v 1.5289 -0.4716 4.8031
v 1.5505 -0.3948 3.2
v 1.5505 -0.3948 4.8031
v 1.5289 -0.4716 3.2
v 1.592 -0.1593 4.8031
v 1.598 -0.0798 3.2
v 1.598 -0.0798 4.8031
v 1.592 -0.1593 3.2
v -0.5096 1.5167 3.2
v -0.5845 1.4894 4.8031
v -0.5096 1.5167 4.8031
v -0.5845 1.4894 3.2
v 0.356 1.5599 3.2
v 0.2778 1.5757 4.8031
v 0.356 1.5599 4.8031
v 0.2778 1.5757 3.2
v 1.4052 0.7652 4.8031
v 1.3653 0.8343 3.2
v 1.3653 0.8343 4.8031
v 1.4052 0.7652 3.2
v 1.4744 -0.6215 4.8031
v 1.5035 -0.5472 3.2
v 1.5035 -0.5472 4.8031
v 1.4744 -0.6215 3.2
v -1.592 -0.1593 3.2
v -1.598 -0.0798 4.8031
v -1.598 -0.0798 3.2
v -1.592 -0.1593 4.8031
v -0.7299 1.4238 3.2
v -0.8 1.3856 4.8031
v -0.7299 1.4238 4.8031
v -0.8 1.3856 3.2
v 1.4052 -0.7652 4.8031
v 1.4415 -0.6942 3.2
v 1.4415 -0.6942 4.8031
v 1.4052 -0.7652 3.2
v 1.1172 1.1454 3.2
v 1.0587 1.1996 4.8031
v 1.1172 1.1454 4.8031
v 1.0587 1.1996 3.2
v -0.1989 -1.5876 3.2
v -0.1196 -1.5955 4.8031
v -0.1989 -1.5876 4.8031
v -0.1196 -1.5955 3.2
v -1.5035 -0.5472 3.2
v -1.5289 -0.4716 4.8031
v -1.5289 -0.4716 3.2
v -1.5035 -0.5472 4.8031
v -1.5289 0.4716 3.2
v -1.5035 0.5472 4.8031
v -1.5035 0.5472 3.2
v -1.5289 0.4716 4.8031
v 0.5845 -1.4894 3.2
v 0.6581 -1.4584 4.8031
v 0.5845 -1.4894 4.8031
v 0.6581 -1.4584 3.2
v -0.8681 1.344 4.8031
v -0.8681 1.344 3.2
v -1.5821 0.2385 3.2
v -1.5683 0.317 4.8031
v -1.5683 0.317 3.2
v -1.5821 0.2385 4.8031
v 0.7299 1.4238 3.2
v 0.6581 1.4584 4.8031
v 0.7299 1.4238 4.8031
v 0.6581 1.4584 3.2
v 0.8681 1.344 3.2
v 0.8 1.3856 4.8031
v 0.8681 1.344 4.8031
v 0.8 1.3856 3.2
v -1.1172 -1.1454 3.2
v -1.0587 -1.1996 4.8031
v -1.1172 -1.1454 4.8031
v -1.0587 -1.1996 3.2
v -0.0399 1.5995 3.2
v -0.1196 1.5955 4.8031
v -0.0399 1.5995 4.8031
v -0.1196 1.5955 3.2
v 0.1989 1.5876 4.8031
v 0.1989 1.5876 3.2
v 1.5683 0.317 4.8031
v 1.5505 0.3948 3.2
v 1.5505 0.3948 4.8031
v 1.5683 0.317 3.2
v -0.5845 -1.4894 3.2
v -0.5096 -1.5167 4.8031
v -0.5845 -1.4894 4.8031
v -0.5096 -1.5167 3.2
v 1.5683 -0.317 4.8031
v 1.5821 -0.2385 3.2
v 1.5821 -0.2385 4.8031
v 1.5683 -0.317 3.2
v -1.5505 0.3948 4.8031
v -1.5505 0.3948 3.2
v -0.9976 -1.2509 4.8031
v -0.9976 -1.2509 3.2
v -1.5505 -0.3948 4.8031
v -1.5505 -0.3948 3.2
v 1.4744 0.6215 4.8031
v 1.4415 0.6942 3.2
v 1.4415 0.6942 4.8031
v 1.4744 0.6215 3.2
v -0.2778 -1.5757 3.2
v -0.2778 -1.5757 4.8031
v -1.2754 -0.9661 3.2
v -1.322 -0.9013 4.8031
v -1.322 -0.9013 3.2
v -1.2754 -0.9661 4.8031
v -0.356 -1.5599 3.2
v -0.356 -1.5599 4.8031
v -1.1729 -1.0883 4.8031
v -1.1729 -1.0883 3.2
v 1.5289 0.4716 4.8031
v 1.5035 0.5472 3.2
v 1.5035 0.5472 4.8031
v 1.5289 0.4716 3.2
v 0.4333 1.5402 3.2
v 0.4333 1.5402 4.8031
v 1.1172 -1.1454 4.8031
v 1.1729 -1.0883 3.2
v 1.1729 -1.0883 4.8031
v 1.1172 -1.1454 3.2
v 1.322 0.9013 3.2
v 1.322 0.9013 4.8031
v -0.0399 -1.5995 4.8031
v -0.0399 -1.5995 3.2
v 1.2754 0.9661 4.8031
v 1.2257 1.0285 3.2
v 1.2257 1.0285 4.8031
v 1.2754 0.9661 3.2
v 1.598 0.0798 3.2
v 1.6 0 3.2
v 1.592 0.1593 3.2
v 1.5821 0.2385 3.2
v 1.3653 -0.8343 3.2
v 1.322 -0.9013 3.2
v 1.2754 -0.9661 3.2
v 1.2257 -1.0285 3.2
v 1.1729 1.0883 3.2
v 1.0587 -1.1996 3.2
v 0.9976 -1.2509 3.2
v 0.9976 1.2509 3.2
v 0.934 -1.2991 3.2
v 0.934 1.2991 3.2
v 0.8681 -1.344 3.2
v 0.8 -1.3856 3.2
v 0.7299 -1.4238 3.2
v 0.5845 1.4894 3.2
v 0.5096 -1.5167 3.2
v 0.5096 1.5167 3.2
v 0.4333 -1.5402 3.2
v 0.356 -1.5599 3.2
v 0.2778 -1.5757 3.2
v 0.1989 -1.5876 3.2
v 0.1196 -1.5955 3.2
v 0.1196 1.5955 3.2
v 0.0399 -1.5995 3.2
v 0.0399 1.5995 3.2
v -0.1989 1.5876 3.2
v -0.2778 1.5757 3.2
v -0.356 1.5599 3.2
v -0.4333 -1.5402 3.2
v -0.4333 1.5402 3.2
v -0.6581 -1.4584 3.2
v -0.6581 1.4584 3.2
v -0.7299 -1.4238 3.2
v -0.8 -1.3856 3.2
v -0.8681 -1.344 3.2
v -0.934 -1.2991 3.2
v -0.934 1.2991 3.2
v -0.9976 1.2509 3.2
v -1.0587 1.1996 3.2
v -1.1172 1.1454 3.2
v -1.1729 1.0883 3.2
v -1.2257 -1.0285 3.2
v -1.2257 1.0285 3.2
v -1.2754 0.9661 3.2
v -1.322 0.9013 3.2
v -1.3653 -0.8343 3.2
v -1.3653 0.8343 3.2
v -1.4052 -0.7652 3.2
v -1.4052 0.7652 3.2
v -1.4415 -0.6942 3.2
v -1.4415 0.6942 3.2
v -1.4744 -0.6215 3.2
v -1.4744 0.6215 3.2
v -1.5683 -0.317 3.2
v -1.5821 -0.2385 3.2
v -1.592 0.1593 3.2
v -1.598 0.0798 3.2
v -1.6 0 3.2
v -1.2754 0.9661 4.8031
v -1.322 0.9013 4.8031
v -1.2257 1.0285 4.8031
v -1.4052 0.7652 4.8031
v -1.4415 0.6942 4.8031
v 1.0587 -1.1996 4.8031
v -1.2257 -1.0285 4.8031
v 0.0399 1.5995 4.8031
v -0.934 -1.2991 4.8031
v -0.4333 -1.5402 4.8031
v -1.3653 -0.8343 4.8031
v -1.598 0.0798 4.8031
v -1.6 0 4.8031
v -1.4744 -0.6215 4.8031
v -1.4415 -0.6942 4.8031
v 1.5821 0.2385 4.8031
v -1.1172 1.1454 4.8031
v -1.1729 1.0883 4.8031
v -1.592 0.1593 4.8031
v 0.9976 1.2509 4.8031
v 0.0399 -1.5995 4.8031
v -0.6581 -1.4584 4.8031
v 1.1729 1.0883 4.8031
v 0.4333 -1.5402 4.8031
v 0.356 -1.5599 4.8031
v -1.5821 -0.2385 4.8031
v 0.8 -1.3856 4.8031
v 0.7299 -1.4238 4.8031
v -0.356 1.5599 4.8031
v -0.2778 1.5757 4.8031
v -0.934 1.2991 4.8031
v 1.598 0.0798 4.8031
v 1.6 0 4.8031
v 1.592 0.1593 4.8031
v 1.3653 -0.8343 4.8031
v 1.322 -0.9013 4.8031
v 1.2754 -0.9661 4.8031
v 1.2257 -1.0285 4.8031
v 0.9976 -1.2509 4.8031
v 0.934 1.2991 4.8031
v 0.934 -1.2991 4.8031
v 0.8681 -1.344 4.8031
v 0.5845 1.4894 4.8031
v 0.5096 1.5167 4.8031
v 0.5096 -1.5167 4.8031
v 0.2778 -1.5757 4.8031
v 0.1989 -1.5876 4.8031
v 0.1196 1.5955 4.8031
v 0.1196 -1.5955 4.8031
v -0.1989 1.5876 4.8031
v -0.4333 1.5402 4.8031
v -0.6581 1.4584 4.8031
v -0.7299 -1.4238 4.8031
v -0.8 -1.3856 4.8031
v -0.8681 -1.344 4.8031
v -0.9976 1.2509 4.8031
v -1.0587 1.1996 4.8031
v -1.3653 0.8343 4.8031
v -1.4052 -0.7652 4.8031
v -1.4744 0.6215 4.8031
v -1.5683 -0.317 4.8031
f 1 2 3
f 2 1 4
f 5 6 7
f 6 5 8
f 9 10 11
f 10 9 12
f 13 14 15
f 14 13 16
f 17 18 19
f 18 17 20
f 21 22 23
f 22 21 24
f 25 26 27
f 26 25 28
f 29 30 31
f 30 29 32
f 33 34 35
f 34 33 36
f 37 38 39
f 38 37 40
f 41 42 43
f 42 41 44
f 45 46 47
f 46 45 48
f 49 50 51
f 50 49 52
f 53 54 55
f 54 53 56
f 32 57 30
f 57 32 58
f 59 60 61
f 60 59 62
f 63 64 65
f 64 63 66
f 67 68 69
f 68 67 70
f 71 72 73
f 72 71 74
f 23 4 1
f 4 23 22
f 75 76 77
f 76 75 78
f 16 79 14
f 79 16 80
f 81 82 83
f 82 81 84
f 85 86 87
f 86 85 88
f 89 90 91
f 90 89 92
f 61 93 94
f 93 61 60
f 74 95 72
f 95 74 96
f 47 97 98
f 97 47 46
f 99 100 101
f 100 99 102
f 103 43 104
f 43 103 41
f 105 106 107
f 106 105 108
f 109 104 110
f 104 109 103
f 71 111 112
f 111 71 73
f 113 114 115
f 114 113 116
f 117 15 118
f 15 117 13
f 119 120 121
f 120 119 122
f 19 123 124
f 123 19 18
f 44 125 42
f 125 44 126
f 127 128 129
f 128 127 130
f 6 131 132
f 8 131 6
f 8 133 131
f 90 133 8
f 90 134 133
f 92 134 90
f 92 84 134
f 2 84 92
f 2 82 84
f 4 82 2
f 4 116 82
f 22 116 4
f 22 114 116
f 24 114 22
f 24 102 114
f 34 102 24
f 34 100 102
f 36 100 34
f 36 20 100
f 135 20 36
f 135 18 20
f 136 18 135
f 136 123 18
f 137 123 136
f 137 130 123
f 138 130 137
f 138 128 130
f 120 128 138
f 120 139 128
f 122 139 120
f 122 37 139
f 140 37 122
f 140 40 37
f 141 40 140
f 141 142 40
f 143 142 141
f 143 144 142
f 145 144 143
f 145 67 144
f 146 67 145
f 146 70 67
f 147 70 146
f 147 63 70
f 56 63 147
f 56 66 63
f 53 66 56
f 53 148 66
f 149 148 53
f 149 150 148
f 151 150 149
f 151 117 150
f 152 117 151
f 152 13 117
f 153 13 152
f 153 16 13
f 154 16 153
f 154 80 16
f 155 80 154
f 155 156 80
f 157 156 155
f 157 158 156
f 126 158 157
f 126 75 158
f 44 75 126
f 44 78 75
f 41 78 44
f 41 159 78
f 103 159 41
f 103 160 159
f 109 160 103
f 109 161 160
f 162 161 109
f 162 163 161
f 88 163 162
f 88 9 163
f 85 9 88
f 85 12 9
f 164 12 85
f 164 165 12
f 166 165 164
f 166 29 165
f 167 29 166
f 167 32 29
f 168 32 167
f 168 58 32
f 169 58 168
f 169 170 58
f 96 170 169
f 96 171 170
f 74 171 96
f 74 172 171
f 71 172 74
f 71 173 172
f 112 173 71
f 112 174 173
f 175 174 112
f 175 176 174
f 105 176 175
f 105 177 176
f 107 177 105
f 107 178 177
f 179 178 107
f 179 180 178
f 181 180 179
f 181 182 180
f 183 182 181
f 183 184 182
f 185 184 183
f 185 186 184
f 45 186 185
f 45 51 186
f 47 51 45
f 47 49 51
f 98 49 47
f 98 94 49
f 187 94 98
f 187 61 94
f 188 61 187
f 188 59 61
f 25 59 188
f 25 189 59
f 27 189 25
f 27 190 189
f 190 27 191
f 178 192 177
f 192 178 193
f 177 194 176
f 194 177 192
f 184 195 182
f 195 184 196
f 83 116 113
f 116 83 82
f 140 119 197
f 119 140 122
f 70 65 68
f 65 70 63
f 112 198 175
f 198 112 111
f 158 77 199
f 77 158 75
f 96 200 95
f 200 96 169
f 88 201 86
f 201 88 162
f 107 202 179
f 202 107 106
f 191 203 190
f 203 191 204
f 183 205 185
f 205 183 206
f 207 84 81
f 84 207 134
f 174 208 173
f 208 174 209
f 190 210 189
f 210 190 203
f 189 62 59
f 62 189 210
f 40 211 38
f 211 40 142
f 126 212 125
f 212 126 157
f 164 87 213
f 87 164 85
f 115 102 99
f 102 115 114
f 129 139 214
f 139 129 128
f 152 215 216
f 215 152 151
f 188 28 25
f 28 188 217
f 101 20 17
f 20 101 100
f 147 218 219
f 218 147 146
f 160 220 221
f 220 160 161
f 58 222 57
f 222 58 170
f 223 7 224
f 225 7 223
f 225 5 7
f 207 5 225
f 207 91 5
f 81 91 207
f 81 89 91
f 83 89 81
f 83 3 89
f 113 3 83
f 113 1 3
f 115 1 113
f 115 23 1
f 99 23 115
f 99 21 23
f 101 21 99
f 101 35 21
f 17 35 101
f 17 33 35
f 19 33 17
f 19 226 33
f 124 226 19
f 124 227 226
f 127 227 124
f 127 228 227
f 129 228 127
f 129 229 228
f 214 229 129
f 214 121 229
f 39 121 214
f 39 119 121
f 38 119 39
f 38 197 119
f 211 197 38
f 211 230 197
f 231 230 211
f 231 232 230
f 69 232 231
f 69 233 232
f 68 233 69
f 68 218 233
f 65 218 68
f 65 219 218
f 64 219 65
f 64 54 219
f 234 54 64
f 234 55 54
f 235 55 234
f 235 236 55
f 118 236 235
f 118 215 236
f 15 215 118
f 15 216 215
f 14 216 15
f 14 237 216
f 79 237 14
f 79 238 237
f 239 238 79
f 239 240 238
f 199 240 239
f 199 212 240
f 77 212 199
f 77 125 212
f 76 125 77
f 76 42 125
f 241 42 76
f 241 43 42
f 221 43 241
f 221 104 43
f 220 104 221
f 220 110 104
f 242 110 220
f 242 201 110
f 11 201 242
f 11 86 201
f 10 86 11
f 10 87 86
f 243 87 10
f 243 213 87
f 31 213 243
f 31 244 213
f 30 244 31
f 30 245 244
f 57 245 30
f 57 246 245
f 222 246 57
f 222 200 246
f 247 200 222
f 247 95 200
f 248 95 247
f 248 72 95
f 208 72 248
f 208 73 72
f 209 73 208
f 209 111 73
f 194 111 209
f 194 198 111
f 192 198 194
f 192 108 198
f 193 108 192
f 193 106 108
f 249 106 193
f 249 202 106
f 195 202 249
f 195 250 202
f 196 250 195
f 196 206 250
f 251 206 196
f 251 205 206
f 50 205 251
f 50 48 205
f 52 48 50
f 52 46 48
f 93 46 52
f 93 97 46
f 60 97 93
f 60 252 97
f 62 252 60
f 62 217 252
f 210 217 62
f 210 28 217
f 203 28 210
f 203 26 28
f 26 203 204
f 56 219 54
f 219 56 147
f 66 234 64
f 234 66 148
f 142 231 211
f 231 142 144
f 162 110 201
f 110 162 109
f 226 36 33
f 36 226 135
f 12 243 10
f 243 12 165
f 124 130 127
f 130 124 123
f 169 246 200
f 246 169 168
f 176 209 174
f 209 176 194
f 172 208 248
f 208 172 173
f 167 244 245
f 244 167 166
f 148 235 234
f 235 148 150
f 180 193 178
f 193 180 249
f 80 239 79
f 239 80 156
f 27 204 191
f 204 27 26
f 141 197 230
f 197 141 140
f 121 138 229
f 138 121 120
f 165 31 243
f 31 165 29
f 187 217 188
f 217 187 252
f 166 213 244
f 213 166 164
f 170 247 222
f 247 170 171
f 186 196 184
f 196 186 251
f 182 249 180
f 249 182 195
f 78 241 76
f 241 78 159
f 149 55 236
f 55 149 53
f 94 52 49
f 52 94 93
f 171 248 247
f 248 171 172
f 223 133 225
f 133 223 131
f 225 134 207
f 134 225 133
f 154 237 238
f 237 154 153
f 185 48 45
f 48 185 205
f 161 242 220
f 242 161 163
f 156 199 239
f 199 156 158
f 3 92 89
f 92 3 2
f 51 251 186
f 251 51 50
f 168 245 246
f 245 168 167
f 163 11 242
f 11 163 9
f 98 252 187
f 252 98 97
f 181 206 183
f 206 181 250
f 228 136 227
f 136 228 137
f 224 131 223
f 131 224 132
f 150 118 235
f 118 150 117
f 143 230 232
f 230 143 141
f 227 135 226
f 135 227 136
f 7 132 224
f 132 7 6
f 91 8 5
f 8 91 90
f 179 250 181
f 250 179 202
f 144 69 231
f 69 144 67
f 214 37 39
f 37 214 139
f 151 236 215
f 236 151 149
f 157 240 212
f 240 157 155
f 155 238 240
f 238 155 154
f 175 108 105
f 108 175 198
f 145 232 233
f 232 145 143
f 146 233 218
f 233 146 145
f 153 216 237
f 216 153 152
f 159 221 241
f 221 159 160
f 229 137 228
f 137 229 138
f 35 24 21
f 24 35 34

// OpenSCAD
use <../lib.scad>
use <6258203ec01.scad>
use <93273.scad>
$fa=1; $fs=0.2;
function ldraw_lib__93273d02(realsolid=false) = [
// 0 Slope Brick Curved  4 x  1 Double with Orange and Metallic Silver "CAUTION FAN" Sticker
// 0 Name: 93273d02.dat
// 0 Author: Ulrich Röder [UR]
// 0 !LDRAW_ORG Shortcut UPDATE 2019-01
// 0 !LICENSE Licensed under CC BY 2.0 and CC BY 4.0 : see CAreadme.txt
// 
// 0 BFC CERTIFY CCW
  [0,"BFC","CERTIFY"],
  [0,"BFC","CCW"],
// 
// 0 !KEYWORDS Ford, Mustang, Set 10265
// 
// 0 !HISTORY 2019-06-28 [PTadmin] Official Update 2019-01
// 
// 
// 1 16 0 0 0 1 0 0 0 1 0 0 0 1 93273.dat
  [1,16,0,0,0,1,0,0,0,1,0,0,0,1, ldraw_lib__93273(realsolid)],
// 1 16 0 0 0 1 0 0 0 1 0 0 0 1 6258203ec01.dat
  [1,16,0,0,0,1,0,0,0,1,0,0,0,1, ldraw_lib__6258203ec01(realsolid)],
];
module ldraw_lib__93273d02(step=0, col=false, unit=2/5, alt=false, line=0.2, solid=!$preview)
    makepoly(ldraw_lib__93273d02(solid), step=step, col=col, unit=unit, alt=alt, line=line, solid=solid);
ldraw_lib__93273d02(line=0.2);
